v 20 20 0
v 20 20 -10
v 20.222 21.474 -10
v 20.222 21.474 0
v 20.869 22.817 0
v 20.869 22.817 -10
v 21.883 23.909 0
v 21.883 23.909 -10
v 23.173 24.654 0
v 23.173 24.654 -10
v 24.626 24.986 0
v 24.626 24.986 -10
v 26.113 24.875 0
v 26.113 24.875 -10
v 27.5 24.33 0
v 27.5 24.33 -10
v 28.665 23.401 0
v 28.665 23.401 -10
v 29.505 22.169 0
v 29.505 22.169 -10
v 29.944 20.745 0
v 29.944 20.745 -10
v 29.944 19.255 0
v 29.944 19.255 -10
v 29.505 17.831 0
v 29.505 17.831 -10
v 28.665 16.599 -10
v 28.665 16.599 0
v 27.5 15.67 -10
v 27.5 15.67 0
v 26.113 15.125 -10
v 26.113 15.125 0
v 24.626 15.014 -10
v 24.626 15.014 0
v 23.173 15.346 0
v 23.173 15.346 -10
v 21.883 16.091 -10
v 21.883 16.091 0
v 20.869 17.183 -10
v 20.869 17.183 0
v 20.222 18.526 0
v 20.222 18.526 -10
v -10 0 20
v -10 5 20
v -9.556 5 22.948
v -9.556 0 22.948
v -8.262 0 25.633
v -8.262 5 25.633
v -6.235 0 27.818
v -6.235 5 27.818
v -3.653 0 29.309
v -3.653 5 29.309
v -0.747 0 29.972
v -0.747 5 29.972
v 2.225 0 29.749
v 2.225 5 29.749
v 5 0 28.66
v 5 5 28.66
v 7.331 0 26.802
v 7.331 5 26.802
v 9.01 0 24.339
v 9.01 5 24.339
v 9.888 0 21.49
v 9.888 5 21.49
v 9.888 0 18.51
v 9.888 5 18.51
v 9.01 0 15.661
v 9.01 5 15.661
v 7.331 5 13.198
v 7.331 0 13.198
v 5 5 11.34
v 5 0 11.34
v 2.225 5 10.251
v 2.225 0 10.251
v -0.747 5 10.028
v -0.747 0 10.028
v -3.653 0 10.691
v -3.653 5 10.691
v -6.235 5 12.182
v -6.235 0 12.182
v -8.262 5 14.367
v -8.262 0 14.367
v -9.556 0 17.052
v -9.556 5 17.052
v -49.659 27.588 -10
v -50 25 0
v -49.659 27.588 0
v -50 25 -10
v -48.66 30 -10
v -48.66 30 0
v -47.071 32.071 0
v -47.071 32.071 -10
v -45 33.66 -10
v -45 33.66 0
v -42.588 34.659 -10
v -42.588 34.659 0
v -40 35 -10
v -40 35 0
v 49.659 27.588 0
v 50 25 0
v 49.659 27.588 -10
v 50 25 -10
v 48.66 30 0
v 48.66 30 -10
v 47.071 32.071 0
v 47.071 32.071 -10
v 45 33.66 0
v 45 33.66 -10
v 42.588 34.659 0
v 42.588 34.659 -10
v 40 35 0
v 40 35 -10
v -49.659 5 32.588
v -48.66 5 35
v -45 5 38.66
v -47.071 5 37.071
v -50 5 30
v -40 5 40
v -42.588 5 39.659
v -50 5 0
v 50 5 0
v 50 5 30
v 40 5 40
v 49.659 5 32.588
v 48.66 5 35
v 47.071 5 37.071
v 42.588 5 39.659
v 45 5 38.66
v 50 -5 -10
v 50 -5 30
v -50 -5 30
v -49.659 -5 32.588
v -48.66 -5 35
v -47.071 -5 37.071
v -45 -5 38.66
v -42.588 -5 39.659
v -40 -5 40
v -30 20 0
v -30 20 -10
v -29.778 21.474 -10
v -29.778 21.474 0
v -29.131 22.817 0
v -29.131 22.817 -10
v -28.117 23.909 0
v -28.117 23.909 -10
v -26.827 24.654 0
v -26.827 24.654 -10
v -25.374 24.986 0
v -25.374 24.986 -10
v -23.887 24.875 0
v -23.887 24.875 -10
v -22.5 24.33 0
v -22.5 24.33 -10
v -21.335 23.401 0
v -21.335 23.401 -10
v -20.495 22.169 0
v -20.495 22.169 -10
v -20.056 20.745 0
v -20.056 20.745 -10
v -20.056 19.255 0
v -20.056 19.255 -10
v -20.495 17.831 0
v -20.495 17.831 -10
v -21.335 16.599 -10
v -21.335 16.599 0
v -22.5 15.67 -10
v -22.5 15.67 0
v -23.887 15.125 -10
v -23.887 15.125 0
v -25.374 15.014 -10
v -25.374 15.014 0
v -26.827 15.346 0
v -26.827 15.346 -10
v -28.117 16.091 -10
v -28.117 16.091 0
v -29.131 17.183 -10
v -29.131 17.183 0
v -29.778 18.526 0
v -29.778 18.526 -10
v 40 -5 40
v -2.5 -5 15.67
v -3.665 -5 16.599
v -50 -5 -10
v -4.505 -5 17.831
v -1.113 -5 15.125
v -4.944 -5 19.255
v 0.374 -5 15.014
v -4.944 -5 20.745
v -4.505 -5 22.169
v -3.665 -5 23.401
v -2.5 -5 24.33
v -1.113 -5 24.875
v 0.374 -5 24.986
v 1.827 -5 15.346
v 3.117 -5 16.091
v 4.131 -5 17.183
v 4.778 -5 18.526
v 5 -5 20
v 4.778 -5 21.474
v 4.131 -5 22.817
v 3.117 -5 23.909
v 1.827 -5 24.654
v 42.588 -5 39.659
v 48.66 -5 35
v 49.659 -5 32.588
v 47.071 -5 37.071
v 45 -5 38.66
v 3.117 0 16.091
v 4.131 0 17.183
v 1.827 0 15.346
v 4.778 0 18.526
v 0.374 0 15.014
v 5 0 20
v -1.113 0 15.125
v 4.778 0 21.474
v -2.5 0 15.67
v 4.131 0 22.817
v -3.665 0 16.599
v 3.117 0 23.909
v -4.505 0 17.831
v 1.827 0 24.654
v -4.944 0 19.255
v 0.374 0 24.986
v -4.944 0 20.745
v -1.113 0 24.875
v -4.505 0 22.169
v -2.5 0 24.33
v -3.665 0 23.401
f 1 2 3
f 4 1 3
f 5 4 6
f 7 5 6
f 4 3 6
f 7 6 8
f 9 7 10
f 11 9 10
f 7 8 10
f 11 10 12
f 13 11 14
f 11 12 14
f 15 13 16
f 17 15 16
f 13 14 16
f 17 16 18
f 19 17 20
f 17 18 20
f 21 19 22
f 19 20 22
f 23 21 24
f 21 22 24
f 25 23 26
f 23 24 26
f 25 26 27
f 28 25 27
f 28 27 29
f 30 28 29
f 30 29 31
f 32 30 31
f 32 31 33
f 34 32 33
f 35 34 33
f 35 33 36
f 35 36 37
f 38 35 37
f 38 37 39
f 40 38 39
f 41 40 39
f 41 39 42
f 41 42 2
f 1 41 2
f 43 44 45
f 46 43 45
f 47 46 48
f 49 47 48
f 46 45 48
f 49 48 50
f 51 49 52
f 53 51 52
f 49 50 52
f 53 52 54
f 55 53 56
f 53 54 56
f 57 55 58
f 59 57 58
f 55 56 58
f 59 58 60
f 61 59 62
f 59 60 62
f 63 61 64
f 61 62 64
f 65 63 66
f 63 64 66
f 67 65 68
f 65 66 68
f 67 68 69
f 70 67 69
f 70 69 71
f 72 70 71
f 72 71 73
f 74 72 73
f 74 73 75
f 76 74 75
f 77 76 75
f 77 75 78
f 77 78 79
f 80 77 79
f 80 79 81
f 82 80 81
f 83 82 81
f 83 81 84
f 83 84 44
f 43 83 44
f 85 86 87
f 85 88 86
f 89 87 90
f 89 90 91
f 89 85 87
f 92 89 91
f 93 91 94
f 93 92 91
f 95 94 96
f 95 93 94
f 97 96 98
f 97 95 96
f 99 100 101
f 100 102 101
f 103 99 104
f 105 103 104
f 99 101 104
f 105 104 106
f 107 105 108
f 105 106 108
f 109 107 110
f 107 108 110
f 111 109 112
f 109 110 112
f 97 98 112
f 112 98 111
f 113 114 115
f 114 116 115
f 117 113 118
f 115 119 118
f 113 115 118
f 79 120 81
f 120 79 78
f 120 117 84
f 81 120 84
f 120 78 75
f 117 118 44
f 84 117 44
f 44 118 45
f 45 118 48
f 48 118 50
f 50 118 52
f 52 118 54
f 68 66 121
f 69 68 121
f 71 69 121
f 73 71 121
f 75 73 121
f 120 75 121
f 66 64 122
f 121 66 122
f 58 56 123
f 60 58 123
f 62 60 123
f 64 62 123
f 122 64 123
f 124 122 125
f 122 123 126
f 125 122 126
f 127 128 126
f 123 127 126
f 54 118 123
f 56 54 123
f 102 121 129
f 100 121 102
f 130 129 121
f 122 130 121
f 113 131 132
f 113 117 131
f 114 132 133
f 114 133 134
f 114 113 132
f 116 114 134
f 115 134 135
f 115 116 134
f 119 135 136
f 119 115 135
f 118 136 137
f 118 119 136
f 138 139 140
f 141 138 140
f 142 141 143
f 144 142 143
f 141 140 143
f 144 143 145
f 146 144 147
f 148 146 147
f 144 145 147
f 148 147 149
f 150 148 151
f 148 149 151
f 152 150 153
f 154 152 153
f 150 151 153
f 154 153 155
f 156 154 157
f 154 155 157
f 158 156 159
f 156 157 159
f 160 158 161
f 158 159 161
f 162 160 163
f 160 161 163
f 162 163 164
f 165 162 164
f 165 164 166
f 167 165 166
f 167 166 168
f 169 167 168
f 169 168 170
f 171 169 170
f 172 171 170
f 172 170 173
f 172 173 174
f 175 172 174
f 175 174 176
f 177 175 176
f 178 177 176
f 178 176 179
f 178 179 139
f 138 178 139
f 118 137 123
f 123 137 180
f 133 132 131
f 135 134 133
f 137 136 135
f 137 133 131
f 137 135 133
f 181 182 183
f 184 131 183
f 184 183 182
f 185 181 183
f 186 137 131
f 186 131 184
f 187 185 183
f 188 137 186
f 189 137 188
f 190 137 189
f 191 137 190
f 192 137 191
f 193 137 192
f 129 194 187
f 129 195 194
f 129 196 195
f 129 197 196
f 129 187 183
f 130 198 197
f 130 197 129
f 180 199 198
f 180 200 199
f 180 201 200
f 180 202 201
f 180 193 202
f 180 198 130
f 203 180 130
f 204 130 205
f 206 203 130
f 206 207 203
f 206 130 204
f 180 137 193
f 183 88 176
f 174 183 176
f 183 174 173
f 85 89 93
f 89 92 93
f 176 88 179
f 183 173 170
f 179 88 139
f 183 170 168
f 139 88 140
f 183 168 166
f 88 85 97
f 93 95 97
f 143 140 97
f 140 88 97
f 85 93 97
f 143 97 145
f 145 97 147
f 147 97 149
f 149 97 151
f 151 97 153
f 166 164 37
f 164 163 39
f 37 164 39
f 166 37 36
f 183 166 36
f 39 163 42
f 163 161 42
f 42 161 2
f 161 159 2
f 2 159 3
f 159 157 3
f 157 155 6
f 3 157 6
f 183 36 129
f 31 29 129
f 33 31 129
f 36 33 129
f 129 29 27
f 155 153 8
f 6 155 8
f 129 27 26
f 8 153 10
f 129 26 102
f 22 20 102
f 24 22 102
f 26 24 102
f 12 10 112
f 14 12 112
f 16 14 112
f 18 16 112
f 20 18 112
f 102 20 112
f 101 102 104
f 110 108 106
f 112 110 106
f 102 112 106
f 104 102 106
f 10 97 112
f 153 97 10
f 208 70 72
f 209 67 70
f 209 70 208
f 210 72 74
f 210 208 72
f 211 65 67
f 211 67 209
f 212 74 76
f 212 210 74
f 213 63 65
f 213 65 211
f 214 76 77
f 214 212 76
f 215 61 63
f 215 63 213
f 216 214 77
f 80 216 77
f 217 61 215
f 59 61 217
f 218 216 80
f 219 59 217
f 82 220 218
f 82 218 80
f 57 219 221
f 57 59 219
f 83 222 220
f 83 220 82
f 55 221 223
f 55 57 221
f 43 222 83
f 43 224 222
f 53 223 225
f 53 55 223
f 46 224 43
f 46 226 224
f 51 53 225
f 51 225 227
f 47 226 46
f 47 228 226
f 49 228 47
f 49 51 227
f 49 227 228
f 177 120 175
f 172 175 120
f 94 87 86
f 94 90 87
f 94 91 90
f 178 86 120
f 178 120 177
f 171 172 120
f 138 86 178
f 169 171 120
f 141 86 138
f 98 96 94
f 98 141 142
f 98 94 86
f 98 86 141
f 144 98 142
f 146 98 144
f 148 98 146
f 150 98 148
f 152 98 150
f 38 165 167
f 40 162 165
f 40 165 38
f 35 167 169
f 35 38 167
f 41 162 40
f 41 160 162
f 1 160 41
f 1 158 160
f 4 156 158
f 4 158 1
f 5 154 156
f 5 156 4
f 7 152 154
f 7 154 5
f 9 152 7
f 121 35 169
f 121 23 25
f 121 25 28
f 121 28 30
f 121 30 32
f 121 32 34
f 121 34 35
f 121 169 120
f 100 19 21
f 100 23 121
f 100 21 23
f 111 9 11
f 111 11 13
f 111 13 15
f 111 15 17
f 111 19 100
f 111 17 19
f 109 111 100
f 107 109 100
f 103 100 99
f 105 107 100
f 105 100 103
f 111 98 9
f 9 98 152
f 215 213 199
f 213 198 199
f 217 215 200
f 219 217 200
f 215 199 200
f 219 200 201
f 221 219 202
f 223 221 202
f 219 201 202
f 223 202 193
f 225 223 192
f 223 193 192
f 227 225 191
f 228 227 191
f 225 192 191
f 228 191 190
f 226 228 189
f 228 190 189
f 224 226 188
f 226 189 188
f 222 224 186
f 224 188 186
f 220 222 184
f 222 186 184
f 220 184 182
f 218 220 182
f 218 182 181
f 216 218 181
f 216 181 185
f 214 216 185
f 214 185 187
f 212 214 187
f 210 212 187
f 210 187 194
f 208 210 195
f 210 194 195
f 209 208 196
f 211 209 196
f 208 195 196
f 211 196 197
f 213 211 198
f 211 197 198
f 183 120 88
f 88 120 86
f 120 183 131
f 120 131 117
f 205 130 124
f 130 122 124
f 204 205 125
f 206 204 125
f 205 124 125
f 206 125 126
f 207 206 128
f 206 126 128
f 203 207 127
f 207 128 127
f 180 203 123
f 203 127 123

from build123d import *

# Parameters (mm, degrees)
F0_W           = 100
F0_H           = 40
F1_DEPTH       = 5
F2_R           = 10
F3_W           = 100
F3_H           = 40
F4_DEPTH       = 10
F5_R           = 10
F8_D           = 10
F9_D           = 10
F9_CBORE_D     = 20
F9_CBORE_DEPTH = 5


with BuildPart() as f1:
    # F0 (on Front) → F1 (new body, symmetric)
    with BuildSketch(Plane.XZ):
        with Locations((0, 20)):
            Rectangle(F0_W, F0_H)
    extrude(amount=F1_DEPTH, both=True)

    # F2
    f2_edges = [f1.edges().sort_by_distance(p)[0] for p in [
        (-50, 0, 40),
        (50, 0, 40),
    ]]
    fillet(f2_edges, radius=F2_R)

    # F3 (on Top) → F4 (join)
    with BuildSketch(Plane.XY):
        with Locations((0, 15)):
            Rectangle(F3_W, F3_H)
    extrude(amount=-F4_DEPTH)

    # F5
    f5_edges = [f1.edges().sort_by_distance(p)[0] for p in [
        (-50, 35, -5),
        (50, 35, -5),
    ]]
    fillet(f5_edges, radius=F5_R)

    # F8 (through all)
    with Locations(Plane.XY):
        with Locations((25, 20), (-25, 20)):
            Hole(F8_D / 2)

    # F9 (through all)
    with Locations(Plane(origin=(0, 5, 0), x_dir=(-1, 0, 0), z_dir=(0, 1, 0))):
        with Locations((0, 20)):
            CounterBoreHole(F9_D / 2, F9_CBORE_D / 2, F9_CBORE_DEPTH)


solid = f1.part
